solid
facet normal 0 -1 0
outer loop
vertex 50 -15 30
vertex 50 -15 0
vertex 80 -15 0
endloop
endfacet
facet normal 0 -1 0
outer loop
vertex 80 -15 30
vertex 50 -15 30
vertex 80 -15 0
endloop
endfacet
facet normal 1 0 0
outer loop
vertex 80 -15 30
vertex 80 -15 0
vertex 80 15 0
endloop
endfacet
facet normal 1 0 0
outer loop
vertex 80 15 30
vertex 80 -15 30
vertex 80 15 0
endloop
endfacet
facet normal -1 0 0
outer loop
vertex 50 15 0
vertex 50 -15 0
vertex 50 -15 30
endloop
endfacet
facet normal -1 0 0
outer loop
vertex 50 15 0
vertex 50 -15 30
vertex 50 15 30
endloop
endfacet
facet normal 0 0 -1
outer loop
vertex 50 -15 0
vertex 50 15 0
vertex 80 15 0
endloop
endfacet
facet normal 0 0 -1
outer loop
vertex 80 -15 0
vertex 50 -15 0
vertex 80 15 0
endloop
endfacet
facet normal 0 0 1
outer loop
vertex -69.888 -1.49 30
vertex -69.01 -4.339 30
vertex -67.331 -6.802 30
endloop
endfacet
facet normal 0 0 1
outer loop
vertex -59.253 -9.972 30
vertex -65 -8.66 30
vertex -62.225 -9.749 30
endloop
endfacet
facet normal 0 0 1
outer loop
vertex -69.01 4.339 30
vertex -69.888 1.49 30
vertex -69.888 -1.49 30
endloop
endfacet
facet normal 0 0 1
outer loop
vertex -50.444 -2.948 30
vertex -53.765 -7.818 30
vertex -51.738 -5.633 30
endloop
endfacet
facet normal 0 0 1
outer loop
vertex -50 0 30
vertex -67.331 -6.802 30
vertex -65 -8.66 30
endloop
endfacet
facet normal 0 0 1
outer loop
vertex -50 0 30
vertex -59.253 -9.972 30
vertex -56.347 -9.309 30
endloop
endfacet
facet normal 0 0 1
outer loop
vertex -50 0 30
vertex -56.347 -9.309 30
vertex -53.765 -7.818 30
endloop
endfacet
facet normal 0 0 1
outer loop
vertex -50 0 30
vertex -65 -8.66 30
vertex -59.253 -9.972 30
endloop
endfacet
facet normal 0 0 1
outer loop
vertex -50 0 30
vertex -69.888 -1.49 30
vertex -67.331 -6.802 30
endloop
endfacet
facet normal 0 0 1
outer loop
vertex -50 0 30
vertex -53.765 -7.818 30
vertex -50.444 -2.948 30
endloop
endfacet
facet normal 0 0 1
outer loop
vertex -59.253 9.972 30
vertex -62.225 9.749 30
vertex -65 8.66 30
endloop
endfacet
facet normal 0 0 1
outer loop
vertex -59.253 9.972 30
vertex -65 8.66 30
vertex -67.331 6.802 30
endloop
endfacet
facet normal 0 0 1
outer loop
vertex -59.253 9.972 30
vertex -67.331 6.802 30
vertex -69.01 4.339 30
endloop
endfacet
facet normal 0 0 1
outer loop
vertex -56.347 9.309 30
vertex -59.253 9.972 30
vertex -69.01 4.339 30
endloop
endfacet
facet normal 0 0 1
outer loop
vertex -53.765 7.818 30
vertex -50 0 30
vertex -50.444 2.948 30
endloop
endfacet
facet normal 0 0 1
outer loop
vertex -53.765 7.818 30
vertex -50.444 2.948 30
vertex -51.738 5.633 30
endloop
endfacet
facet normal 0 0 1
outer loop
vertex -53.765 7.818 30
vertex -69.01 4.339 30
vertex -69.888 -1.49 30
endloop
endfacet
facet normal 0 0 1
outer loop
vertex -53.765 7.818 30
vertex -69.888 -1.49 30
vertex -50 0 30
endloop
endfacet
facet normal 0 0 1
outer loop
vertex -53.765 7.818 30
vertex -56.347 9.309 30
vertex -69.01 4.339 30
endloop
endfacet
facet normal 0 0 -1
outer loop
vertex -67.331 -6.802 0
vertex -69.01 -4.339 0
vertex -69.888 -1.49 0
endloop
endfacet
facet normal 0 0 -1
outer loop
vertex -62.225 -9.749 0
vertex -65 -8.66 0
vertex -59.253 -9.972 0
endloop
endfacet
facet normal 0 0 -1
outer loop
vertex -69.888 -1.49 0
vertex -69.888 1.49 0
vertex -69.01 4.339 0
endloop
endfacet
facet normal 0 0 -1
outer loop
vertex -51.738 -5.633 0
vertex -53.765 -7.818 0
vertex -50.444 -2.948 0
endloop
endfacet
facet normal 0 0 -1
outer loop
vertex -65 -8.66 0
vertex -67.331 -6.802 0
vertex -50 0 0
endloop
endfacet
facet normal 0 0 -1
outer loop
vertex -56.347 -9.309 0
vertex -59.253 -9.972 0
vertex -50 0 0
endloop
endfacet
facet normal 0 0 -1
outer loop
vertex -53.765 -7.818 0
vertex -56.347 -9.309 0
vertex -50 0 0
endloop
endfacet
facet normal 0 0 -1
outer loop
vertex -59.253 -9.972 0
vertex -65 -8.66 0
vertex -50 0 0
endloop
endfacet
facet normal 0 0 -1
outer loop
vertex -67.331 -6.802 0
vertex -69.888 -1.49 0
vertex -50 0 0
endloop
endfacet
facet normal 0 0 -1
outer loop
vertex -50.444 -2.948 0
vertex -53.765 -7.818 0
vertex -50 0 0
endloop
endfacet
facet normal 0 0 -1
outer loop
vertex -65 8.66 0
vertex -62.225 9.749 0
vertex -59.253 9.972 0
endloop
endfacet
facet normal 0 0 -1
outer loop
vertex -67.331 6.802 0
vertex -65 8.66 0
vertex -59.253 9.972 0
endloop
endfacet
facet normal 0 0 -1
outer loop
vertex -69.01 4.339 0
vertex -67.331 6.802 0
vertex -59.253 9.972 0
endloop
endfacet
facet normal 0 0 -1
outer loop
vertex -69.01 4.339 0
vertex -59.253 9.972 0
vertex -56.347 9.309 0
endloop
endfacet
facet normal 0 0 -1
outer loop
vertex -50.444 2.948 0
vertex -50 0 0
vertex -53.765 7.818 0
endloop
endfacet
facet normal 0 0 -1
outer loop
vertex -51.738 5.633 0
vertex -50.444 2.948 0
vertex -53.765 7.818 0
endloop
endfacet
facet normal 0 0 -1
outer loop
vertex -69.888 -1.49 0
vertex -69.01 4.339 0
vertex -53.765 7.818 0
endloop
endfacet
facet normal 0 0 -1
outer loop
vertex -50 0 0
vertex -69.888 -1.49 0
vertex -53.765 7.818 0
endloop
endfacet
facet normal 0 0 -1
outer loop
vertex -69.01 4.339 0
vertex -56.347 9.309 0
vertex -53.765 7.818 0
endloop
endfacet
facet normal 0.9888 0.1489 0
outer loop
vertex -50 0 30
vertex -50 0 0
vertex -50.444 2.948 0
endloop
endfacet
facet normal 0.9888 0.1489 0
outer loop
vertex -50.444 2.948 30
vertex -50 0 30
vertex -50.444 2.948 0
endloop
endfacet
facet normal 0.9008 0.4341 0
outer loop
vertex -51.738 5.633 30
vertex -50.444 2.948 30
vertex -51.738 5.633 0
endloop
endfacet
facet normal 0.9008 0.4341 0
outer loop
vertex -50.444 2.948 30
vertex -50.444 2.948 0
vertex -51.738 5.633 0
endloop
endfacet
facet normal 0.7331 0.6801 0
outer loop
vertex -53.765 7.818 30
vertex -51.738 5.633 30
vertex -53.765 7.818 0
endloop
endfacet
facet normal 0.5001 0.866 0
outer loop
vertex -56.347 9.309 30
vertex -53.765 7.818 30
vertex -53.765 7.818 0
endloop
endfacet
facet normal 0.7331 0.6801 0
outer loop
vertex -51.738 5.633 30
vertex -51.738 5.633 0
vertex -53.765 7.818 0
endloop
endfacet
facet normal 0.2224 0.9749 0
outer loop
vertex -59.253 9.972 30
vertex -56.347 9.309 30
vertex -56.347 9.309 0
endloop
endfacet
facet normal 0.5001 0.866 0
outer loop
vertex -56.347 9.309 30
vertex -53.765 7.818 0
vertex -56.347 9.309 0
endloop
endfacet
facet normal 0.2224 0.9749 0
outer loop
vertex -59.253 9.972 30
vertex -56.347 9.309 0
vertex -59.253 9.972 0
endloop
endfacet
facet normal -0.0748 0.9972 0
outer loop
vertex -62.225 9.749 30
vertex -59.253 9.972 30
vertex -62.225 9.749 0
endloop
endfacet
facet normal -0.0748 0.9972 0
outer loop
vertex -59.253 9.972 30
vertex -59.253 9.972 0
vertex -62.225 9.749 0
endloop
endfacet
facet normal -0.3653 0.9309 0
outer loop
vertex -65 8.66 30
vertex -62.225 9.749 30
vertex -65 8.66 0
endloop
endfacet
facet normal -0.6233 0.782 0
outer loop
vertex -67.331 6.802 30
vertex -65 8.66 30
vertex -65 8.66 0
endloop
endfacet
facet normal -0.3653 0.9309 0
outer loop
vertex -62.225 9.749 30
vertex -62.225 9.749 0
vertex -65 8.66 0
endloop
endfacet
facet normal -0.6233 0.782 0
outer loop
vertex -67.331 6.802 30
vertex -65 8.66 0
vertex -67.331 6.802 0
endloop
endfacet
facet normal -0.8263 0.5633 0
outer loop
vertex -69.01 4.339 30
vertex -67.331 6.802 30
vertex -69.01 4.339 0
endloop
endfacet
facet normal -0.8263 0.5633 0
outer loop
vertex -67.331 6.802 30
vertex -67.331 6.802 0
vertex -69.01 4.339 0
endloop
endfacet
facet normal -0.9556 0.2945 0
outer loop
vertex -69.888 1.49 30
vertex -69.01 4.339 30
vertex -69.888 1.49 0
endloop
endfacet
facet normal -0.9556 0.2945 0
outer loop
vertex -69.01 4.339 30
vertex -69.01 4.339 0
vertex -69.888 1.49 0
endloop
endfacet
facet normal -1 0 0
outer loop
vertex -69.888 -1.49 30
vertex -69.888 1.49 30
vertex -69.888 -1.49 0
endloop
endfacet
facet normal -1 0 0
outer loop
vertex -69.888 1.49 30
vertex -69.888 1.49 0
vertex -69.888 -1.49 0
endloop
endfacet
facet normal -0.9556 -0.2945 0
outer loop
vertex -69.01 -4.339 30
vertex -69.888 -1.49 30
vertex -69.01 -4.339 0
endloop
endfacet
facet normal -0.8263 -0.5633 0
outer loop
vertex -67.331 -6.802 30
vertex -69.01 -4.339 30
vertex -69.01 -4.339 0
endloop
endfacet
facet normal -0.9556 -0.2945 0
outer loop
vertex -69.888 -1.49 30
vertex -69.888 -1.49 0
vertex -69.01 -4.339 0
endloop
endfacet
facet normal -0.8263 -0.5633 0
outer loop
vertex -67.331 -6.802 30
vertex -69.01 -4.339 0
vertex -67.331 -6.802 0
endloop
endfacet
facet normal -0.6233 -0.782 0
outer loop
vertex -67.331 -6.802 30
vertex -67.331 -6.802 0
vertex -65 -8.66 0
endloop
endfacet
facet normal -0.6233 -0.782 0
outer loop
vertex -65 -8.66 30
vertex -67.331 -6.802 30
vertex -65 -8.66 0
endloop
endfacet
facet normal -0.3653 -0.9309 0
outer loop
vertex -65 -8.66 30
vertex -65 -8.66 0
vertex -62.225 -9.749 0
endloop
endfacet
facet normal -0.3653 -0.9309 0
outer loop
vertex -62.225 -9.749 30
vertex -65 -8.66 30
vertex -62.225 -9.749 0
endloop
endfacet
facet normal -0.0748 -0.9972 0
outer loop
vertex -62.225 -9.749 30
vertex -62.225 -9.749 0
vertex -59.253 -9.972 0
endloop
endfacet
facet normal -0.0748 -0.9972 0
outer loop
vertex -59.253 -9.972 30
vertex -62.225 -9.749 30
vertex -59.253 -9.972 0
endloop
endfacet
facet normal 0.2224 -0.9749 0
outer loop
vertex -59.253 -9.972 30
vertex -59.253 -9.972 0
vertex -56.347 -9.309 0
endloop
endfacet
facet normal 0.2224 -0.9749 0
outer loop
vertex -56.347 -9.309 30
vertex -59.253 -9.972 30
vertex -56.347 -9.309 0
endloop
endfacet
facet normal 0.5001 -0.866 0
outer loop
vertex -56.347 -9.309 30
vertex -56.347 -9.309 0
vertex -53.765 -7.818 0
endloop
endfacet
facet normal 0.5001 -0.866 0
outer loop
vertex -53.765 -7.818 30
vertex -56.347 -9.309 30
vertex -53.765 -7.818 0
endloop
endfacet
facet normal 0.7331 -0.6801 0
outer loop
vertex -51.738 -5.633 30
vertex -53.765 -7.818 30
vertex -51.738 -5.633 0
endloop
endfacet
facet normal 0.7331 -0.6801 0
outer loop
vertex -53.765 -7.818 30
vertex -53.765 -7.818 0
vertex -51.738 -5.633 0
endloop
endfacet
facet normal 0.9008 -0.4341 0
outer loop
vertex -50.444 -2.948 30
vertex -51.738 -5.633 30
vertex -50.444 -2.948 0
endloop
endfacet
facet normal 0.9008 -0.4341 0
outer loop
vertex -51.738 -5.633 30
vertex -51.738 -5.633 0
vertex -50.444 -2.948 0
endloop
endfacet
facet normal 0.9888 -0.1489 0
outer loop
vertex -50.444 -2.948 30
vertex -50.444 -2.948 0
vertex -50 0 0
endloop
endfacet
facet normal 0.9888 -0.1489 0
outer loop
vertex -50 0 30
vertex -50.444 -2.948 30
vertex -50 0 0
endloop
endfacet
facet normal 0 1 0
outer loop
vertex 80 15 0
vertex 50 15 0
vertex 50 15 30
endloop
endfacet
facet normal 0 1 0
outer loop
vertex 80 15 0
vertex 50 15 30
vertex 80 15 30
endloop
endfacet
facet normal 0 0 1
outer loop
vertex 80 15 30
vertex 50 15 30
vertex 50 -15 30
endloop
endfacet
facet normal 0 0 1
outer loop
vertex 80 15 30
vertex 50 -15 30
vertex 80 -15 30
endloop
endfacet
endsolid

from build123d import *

# Parameters (mm, degrees)
SKETCH_R     = 10
PAD_DEPTH    = 30
SKETCH001_W  = 30
SKETCH001_H  = 30
PAD001_DEPTH = 30


with BuildPart() as body:
    # Sketch → Pad (new body)
    with BuildSketch(Plane.XY):
        with Locations((-60, 0)):
            Circle(SKETCH_R)
    extrude(amount=PAD_DEPTH)


with BuildPart() as body001:
    # Sketch001 → Pad001 (new body)
    with BuildSketch(Plane.XY):
        with Locations((65, 0)):
            Rectangle(SKETCH001_W, SKETCH001_H)
    extrude(amount=PAD001_DEPTH)


solid = Compound([body.part, body001.part])
